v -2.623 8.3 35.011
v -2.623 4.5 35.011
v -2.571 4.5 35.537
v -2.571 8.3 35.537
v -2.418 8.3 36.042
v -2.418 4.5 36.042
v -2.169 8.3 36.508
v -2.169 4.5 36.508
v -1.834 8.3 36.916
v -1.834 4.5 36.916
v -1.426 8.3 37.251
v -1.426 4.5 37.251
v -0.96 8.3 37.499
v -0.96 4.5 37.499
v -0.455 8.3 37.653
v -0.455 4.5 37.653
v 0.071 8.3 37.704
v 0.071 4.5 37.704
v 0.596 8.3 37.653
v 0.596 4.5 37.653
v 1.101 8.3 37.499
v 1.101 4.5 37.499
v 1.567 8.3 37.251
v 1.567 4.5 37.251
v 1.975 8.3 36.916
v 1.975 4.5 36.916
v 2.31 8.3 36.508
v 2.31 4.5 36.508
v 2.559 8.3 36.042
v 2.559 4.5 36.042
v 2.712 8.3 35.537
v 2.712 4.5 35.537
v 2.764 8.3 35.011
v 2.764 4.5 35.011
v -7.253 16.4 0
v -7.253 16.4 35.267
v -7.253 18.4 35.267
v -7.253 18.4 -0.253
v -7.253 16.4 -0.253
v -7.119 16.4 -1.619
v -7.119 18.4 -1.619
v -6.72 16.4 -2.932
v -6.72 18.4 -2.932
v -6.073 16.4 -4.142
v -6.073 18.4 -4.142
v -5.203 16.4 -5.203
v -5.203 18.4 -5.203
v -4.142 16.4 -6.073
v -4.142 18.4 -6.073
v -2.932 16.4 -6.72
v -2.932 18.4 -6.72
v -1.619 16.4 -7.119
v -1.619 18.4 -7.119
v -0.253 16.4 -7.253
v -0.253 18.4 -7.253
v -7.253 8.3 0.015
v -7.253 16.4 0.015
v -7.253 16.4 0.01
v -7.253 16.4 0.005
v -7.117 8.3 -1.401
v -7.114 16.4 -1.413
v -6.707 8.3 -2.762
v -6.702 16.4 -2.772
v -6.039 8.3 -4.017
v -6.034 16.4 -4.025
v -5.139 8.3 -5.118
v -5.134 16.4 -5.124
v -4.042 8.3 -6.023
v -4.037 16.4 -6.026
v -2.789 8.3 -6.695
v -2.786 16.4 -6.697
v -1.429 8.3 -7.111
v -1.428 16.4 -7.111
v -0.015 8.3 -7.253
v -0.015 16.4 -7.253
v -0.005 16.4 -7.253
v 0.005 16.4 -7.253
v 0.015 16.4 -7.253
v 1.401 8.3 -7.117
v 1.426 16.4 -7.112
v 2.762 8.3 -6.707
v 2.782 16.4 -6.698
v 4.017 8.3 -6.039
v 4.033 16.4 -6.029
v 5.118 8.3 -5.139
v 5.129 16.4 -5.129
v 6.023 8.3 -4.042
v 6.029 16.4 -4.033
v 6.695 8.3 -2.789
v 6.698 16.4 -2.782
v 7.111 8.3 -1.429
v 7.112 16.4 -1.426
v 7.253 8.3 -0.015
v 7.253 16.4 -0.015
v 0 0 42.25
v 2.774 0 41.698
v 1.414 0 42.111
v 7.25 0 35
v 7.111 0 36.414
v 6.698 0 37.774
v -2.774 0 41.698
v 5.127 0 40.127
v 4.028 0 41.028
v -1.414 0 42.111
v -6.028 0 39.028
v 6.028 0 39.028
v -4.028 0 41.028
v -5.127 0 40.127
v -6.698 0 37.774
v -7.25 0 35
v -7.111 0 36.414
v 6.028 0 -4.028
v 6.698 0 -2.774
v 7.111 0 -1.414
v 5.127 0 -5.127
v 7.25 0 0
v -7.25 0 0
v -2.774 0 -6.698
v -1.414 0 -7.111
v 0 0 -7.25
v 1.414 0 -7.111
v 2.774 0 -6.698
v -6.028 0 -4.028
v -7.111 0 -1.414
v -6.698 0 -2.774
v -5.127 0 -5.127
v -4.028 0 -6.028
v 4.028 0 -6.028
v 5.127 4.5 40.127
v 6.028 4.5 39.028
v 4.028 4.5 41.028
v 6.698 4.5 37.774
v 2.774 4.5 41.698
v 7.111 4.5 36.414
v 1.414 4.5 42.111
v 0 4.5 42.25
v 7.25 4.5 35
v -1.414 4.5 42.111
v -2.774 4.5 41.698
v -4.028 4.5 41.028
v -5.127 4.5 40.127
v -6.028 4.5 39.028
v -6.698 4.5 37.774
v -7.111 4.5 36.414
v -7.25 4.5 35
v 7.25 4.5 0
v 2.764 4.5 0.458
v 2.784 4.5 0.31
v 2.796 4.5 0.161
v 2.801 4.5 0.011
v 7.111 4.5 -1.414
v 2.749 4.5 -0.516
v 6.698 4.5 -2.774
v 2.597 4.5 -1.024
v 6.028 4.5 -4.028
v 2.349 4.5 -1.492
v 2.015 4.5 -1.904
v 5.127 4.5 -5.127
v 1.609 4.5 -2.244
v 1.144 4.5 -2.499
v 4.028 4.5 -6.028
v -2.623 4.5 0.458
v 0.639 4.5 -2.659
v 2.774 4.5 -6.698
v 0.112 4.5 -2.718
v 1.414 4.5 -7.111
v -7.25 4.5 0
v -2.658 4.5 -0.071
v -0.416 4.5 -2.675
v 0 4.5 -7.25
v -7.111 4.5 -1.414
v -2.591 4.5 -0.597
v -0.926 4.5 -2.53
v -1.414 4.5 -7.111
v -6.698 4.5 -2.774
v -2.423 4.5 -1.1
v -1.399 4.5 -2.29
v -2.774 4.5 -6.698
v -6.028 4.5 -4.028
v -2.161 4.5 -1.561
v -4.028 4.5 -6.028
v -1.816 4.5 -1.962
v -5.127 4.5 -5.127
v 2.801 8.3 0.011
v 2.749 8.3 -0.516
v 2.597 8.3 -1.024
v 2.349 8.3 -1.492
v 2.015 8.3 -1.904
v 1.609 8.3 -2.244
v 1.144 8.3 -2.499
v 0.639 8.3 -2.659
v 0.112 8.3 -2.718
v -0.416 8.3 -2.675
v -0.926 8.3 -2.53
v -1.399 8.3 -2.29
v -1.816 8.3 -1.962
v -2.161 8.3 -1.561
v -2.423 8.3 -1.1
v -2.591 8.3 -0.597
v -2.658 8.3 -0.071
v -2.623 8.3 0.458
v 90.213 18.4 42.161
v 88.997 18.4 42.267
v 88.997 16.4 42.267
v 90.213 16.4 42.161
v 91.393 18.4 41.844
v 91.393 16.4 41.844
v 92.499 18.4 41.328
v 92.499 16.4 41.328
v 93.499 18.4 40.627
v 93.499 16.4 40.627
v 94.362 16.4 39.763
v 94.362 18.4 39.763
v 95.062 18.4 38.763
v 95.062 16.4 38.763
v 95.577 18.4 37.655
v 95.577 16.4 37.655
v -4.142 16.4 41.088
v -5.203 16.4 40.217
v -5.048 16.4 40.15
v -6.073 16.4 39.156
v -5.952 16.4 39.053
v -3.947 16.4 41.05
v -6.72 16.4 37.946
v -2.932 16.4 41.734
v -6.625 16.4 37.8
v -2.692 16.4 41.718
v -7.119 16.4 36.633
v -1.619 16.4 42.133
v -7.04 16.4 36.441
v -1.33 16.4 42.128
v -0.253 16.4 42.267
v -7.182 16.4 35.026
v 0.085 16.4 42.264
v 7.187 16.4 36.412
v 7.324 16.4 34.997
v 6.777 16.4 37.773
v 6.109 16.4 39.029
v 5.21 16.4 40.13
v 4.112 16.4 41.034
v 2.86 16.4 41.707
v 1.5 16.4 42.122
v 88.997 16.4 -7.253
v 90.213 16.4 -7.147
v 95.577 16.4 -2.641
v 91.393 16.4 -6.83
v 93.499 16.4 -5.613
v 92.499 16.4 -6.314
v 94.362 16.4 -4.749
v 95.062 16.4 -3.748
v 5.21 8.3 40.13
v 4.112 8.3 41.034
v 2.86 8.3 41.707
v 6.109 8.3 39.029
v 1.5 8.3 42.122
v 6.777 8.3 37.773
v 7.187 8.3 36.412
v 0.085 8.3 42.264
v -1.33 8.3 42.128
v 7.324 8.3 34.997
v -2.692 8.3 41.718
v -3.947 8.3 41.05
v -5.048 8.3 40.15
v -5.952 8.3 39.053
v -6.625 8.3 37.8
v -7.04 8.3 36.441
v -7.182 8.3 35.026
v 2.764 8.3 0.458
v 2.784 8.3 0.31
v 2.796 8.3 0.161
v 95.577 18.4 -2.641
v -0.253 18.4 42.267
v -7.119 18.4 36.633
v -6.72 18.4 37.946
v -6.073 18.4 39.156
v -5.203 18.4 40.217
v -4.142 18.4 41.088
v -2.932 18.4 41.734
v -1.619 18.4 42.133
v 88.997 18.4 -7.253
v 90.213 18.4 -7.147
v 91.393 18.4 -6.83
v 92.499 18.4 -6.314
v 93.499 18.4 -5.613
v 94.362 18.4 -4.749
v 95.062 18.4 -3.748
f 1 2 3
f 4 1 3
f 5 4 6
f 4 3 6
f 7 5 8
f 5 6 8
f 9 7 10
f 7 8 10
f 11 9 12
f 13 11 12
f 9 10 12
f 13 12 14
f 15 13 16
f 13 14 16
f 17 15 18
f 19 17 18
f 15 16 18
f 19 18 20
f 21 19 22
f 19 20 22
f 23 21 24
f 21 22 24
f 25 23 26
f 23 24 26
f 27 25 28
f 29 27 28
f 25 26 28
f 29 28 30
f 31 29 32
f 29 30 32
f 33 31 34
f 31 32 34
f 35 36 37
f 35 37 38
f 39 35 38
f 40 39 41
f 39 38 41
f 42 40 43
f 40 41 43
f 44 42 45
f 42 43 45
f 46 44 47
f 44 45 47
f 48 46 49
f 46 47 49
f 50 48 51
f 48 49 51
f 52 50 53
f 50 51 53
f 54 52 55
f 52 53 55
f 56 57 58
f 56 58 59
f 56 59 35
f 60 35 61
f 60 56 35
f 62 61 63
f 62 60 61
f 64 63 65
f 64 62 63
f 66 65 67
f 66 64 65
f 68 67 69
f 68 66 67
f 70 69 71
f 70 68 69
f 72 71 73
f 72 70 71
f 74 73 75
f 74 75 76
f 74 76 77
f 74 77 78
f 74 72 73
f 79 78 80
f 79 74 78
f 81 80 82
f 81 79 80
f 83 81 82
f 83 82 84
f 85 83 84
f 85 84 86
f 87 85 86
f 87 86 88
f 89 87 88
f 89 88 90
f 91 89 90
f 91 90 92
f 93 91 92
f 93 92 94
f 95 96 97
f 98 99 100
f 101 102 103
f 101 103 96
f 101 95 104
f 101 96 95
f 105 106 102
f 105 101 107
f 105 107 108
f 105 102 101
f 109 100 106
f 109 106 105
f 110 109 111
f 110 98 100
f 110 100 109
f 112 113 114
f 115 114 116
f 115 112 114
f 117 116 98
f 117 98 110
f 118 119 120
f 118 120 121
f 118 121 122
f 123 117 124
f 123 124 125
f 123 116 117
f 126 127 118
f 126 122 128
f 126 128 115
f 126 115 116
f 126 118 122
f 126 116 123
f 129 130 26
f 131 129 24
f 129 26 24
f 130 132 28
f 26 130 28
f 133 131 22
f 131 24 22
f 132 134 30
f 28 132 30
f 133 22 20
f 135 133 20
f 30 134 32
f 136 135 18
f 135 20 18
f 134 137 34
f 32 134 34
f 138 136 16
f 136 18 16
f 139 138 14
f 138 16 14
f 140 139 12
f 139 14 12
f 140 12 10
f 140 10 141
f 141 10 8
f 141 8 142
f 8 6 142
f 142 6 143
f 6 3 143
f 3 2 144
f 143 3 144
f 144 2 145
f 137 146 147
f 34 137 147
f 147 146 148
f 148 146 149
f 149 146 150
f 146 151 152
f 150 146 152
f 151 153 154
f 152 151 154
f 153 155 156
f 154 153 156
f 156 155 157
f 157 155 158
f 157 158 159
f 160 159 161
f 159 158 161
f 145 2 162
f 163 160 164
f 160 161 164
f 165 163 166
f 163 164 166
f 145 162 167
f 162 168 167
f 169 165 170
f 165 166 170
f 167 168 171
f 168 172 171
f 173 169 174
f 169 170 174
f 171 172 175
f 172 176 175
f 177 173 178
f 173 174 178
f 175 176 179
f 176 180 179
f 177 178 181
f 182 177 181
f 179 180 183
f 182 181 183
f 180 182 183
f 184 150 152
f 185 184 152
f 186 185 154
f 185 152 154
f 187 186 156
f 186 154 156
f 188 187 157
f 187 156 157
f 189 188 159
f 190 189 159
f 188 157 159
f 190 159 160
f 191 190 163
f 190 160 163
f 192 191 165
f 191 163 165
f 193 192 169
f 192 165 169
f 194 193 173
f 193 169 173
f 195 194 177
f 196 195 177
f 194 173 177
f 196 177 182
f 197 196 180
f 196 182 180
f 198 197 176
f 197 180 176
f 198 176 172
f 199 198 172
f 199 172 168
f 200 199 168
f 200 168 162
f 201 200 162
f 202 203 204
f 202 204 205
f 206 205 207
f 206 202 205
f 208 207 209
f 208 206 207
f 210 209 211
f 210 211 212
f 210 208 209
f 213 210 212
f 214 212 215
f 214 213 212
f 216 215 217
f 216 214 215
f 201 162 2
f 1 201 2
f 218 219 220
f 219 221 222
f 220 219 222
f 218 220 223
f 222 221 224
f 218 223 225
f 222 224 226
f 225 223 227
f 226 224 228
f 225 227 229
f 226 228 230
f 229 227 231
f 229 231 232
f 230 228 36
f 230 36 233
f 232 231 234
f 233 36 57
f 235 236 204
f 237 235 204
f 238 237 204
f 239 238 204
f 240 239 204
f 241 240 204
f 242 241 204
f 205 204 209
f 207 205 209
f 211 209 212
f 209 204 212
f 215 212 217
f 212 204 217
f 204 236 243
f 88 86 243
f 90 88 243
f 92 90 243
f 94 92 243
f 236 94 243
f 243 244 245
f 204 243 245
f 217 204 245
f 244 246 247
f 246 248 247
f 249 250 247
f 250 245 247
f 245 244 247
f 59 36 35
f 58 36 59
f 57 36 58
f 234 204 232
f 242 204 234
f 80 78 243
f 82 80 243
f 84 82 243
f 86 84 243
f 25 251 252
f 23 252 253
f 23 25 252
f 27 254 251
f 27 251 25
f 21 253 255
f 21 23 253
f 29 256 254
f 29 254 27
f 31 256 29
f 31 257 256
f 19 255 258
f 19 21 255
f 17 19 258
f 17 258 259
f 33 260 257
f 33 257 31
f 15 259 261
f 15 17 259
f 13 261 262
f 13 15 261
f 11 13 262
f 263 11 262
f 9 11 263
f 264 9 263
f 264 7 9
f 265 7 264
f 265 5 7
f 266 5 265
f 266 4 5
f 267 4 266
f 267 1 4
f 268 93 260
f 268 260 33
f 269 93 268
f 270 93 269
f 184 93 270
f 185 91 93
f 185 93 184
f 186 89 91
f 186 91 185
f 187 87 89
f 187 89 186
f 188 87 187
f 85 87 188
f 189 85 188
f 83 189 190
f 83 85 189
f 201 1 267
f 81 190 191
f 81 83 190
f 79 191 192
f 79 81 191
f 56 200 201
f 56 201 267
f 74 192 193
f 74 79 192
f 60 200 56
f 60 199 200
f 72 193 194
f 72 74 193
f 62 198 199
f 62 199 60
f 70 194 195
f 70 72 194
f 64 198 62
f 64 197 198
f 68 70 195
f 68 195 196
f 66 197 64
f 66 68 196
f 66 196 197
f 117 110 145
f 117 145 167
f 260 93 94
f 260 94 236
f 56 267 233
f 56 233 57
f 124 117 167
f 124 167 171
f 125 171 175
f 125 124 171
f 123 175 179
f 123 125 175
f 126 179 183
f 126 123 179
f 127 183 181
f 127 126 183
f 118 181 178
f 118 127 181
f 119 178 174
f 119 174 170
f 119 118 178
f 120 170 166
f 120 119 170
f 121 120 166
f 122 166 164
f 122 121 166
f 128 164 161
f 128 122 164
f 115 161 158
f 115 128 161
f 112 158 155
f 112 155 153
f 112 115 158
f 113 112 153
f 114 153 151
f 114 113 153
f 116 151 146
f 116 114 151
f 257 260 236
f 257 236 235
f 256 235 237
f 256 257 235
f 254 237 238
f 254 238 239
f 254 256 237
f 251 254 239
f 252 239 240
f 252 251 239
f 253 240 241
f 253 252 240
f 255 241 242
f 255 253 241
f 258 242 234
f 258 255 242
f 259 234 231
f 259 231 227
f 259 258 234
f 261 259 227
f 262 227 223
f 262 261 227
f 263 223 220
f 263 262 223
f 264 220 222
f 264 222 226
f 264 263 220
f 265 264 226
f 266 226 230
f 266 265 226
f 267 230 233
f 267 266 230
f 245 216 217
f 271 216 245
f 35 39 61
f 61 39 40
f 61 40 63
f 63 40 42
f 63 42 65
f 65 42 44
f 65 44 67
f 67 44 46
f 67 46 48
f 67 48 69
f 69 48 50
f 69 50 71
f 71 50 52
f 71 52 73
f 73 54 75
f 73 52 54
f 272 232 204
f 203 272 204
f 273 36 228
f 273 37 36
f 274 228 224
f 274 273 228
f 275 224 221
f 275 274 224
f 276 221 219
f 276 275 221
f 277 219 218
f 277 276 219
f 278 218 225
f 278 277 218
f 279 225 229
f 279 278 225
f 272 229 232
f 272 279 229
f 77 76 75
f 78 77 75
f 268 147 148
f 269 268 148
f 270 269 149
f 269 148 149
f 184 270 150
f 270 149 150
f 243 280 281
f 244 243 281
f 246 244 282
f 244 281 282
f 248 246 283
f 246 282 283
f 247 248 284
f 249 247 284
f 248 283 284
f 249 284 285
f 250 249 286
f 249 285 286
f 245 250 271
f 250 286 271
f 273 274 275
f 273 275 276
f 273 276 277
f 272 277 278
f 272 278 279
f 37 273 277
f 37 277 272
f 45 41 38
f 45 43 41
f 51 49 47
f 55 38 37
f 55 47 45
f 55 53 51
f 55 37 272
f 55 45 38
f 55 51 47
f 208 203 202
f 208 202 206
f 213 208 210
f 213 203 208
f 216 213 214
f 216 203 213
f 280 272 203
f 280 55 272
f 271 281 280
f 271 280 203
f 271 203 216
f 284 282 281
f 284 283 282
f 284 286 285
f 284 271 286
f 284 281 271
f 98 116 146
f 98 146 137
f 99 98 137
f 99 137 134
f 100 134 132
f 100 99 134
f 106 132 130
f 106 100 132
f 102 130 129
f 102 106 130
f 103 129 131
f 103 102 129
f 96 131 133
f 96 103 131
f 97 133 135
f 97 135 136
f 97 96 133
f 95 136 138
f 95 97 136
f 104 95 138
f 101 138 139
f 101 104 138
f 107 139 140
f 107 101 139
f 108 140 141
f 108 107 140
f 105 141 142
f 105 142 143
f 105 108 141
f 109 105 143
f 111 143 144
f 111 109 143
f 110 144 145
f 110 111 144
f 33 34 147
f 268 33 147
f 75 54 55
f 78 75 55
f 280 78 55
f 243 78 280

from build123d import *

# Parameters (mm, degrees)
BOSS_EXTRUDE1_DEPTH = 4.5
BOSS_EXTRUDE2_DEPTH = 3.8
BOSS_EXTRUDE3_DEPTH = 8.1
SKETCH5_W           = 103.25
SKETCH5_H           = 49.520314098
BOSS_EXTRUDE4_DEPTH = 2
FILLET1_R           = 7
SKETCH6_W           = 74.836382047
SKETCH6_H           = 26.769621583
CUT_EXTRUDE1_DEPTH  = 0.42


with BuildPart() as part:
    # Sketch1 → Boss-Extrude1 (new body)
    with BuildSketch(Plane(origin=(0, 0, 0), x_dir=(1, 0, 0), z_dir=(0, 1, 0))):
        with BuildLine():
            Line((7.25, 0), (7.25, -35))
            ThreePointArc((7.25, -35), (0, -42.25), (-7.25, -35))
            Line((-7.25, -35), (-7.25, 0))
            ThreePointArc((-7.25, 0), (0, 7.25), (7.25, 0))
        make_face()
    extrude(amount=BOSS_EXTRUDE1_DEPTH)

    # Sketch3 → Boss-Extrude2 (add)
    with BuildSketch(Plane(origin=(0, 4.5, 0), x_dir=(1, 0, 0), z_dir=(0, 1, 0))):
        with BuildLine():
            Line((-2.622571491, -0.457666807), (-2.622571491, -35.011296081))
            ThreePointArc((-2.622571491, -35.011296081), (0.070610389, -37.704477961), (2.763792269, -35.011296081))
            Line((2.763792269, -35.011296081), (2.763792269, -0.457666807))
            ThreePointArc((2.763792269, -0.457666807), (0.070610389, 2.718626164), (-2.622571491, -0.457666807))
        make_face()
    extrude(amount=BOSS_EXTRUDE2_DEPTH)

    # Sketch4 → Boss-Extrude3 (add)
    with BuildSketch(Plane(origin=(0, 8.3, 0), x_dir=(1, 0, 0), z_dir=(0, 1, 0))):
        with BuildLine():
            Line((7.25308141, 0.014627933), (7.323691799, -34.996668148))
            ThreePointArc((7.323691799, -34.996668148), (0.085238322, -42.264377491), (-7.182471021, -35.025924014))
            Line((-7.182471021, -35.025924014), (-7.25308141, -0.014627933))
            ThreePointArc((-7.25308141, -0.014627933), (-0.014627933, 7.25308141), (7.25308141, 0.014627933))
        make_face()
    extrude(amount=BOSS_EXTRUDE3_DEPTH)

    # Sketch5 → Boss-Extrude4 (add)
    with BuildSketch(Plane(origin=(0, 16.4, 0), x_dir=(1, 0, 0), z_dir=(0, 1, 0))):
        with Locations((44.371903839, -17.507075639)):
            Rectangle(SKETCH5_W, SKETCH5_H)
    extrude(amount=BOSS_EXTRUDE4_DEPTH)

    # Fillet1
    fillet1_edges = [part.edges().sort_by_distance(p)[0] for p in [
        (95.996903839, 17.4, 42.267232688),
        (95.996903839, 17.4, -7.25308141),
        (-7.253096161, 17.4, -7.25308141),
        (-7.253096161, 17.4, 42.267232688),
    ]]
    fillet(fillet1_edges, radius=FILLET1_R)

    # Sketch6 → Cut-Extrude1 (cut)
    with BuildSketch(Plane(origin=(95.996903839, 0, 0), x_dir=(0, 0, -1), z_dir=(1, 0, 0))):
        with Locations((-22.928368507, 17.221399119)):
            Rectangle(SKETCH6_W, SKETCH6_H)
    extrude(amount=-CUT_EXTRUDE1_DEPTH, mode=Mode.SUBTRACT)


solid = part.part
